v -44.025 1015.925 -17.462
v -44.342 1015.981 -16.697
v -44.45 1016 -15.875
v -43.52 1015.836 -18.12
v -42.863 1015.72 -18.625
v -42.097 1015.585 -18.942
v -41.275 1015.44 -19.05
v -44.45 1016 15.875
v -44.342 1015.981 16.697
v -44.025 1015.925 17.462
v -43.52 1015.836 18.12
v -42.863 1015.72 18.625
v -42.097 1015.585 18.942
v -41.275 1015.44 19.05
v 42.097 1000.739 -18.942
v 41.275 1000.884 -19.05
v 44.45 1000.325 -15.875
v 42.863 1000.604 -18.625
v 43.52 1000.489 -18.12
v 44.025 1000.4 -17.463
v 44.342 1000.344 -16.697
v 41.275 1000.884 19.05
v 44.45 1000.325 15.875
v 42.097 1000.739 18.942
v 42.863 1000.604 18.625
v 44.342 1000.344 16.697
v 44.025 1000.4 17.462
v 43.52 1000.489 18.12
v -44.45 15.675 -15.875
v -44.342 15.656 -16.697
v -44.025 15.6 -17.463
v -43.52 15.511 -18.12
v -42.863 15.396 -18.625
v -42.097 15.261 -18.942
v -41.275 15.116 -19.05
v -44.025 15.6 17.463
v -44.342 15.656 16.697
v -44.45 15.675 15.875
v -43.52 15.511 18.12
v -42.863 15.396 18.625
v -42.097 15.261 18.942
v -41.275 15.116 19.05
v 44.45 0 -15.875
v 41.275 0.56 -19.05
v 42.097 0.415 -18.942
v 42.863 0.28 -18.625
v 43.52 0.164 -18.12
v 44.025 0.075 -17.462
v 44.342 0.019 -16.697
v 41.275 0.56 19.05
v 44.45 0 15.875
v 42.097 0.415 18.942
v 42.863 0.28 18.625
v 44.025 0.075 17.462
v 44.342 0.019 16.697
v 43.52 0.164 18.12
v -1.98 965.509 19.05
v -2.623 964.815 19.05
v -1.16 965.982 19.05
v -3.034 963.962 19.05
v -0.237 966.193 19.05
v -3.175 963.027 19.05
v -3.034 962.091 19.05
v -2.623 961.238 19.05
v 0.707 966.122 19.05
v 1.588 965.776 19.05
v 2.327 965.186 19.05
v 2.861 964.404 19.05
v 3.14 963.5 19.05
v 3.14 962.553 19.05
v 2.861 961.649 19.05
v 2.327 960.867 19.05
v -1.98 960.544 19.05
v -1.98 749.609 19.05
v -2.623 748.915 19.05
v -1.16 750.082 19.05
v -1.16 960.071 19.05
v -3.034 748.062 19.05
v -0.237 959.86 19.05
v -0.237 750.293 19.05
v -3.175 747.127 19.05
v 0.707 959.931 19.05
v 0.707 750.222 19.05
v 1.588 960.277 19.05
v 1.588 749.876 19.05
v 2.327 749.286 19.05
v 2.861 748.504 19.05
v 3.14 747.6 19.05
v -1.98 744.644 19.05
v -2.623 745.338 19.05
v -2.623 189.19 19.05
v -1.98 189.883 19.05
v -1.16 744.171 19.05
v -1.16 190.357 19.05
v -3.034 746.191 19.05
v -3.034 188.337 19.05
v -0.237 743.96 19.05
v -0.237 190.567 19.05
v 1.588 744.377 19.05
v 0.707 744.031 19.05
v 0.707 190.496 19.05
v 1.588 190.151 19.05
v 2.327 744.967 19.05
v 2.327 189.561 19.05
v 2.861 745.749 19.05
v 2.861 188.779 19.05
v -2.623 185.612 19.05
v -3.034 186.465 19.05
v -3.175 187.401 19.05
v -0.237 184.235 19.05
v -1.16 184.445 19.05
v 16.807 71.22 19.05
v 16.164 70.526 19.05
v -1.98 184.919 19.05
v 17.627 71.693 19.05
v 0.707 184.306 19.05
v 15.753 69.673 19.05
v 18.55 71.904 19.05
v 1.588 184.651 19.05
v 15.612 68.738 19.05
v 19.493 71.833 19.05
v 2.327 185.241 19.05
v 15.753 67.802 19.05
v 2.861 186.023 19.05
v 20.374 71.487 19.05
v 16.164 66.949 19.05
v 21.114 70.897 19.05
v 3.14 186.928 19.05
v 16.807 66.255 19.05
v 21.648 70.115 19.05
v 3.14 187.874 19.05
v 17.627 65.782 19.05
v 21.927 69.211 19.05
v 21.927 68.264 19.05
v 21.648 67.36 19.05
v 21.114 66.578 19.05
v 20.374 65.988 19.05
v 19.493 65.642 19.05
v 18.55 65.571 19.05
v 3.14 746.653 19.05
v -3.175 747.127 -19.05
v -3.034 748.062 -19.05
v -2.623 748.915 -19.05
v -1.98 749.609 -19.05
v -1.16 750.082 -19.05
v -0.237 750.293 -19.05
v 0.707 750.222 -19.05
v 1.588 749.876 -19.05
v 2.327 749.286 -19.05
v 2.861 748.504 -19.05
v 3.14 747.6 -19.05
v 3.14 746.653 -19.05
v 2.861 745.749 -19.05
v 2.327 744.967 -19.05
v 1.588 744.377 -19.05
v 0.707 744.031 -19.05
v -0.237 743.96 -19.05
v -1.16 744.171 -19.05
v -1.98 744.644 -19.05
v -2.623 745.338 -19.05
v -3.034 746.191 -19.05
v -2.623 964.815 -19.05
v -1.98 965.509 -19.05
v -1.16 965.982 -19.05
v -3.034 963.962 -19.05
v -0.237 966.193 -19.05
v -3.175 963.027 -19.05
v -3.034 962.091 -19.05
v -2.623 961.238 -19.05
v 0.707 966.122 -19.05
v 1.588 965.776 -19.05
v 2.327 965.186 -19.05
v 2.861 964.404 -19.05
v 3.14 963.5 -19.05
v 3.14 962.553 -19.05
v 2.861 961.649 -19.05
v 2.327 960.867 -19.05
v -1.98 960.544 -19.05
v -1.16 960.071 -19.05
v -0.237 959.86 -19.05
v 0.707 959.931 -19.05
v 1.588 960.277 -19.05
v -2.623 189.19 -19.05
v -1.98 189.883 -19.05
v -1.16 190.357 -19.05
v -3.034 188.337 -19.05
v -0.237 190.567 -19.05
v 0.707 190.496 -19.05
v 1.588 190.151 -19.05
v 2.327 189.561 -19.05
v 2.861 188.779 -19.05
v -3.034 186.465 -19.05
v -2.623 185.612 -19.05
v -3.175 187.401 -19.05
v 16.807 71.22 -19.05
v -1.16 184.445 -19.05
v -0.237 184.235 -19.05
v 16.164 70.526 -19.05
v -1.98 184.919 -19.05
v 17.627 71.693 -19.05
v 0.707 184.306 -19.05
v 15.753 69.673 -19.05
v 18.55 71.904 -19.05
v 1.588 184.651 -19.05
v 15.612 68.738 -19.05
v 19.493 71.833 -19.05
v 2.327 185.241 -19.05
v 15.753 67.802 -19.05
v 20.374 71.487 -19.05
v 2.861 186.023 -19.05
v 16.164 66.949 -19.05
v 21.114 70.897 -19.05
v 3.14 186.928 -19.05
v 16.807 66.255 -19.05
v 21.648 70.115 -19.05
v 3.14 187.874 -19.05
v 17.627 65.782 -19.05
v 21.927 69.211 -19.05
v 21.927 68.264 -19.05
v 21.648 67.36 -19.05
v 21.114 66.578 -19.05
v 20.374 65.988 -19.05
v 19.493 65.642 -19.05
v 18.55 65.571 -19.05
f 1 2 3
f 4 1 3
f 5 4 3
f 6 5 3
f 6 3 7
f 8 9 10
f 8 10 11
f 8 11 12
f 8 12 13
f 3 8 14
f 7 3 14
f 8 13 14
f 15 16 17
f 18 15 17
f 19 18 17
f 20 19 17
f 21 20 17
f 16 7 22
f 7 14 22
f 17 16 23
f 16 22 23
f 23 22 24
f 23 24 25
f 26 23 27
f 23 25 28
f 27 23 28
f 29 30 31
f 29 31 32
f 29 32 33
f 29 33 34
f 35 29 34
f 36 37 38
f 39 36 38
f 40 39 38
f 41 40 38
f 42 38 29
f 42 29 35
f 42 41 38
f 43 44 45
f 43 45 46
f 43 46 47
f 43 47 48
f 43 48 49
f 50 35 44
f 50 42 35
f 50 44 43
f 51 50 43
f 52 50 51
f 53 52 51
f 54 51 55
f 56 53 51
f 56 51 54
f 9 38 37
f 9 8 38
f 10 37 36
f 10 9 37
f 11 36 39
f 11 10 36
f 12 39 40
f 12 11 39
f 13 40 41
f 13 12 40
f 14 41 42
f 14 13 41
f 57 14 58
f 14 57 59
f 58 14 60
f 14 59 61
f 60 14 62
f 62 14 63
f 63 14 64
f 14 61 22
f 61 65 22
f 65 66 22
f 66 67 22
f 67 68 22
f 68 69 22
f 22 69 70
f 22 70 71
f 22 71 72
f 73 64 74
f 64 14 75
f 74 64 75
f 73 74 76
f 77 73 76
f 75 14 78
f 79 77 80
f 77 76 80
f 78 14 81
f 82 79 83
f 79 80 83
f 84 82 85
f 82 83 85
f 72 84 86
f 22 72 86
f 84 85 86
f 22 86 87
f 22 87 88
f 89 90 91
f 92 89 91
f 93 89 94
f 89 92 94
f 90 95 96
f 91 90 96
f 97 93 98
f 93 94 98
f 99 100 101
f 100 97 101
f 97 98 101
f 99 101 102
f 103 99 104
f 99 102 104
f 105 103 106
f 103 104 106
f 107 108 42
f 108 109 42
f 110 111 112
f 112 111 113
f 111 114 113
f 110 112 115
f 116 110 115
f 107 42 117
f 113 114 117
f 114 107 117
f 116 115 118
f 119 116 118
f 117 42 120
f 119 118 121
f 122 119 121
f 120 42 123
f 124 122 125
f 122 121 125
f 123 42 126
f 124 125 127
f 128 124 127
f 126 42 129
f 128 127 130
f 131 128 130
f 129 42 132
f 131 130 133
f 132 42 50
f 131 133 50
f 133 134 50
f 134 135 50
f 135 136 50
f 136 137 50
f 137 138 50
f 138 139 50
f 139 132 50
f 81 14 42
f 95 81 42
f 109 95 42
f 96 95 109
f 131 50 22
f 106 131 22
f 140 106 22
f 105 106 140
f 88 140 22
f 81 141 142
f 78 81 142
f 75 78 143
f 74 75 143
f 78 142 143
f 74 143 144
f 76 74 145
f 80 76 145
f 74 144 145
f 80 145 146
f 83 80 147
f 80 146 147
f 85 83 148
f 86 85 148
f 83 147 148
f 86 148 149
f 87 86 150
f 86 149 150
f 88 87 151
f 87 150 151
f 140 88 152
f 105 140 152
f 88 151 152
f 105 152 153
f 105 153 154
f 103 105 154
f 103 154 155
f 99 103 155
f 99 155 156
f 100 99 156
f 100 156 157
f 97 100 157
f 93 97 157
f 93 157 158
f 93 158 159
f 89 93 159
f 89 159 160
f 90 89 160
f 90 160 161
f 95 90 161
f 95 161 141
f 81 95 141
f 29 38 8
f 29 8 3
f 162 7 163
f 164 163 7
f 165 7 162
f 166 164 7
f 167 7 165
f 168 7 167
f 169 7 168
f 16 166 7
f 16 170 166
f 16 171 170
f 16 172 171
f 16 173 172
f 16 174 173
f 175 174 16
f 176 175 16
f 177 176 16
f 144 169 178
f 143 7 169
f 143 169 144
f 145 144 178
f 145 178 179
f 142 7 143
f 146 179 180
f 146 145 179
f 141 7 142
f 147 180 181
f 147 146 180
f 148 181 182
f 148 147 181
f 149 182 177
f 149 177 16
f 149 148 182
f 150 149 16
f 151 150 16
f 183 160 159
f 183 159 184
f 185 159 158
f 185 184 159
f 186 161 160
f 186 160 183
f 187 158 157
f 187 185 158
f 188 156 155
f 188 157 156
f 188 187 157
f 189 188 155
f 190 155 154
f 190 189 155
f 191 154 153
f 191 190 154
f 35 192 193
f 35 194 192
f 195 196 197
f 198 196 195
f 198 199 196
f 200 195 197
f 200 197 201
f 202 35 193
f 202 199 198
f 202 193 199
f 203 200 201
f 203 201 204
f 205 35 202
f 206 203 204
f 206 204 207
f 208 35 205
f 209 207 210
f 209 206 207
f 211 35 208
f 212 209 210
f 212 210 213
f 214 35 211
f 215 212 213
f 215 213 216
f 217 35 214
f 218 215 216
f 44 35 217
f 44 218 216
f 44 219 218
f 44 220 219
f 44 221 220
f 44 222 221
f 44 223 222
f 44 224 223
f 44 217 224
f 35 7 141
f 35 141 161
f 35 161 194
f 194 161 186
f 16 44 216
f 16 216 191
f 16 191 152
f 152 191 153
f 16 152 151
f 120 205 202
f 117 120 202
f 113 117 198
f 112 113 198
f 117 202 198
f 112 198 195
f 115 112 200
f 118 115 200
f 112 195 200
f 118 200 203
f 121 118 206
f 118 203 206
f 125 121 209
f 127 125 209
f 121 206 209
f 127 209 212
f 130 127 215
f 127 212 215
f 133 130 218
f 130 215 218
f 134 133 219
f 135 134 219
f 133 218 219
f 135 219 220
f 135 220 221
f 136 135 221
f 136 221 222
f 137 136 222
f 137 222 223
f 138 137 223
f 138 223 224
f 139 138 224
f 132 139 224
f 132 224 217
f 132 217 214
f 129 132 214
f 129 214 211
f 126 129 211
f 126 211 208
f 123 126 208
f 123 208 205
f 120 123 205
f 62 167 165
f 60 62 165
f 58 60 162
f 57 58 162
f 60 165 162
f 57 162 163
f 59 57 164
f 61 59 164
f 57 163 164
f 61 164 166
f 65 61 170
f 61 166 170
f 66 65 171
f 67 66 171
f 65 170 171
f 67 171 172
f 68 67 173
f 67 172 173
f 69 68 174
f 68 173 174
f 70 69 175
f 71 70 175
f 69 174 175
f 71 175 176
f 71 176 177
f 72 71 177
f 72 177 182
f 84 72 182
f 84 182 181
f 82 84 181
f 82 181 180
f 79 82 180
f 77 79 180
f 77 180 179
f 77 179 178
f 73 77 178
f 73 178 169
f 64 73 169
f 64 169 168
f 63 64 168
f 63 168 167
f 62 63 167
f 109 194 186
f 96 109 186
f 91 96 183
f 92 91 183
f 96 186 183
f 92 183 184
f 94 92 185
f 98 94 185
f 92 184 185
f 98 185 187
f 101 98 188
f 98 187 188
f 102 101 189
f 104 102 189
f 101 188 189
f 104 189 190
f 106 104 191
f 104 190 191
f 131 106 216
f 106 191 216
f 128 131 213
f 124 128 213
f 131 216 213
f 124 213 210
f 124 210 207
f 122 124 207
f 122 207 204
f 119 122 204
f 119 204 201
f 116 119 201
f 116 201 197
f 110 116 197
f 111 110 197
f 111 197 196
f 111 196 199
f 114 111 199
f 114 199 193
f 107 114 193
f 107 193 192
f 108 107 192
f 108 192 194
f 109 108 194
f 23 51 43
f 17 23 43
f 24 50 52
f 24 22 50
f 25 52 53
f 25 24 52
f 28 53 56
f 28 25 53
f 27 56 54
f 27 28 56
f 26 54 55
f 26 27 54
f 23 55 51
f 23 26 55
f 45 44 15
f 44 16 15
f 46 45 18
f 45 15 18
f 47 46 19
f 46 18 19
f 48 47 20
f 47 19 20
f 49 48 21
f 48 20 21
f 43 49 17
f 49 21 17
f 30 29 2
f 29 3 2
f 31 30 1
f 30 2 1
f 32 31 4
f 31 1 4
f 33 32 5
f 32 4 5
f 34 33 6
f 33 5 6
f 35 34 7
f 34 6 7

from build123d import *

# Parameters (mm, degrees)
SKETCH1_W                   = 88.9
SKETCH1_H                   = 38.1
BOSS_EXTRUDE1_DEPTH         = 1016
CUT_EXTRUDE1_DEPTH          = 1018.685320961
F_1_4_0_25_DIAMETER_HOLE1_D = 6.35
FILLET1_R                   = 3.175


with BuildPart() as part:
    # Sketch1 → Boss-Extrude1 (new body)
    with BuildSketch(Plane(origin=(0, 0, 0), x_dir=(1, 0, 0), z_dir=(0, 1, 0))):
        Rectangle(SKETCH1_W, SKETCH1_H)
    extrude(amount=BOSS_EXTRUDE1_DEPTH)

    # Sketch2 → Cut-Extrude1 (cut, through all)
    with BuildSketch(Plane.XY.offset(19.05)):
        Polygon((44.45, 0), (-44.45, 0), (-44.45, 15.675468585), align=None)
        Polygon((-44.45, 1016), (44.45, 1000.324531415), (44.45, 1016), align=None)
    extrude(amount=-CUT_EXTRUDE1_DEPTH, mode=Mode.SUBTRACT)

    # 1/4 (0.25) Diameter Hole1 (through all)
    with Locations(Plane.XY.offset(19.05)):
        with Locations((18.786968779, 68.737585765), (0, 187.400991466), (0, 747.126552809), (0, 963.026552809)):
            Hole(F_1_4_0_25_DIAMETER_HOLE1_D / 2)

    # Fillet1
    fillet1_edges = [part.edges().sort_by_distance(p)[0] for p in [
        (44.45, 500.162265708, -19.05),
        (44.45, 500.162265708, 19.05),
        (-44.45, 515.837734292, -19.05),
        (-44.45, 515.837734292, 19.05),
    ]]
    fillet(fillet1_edges, radius=FILLET1_R)


solid = part.part
